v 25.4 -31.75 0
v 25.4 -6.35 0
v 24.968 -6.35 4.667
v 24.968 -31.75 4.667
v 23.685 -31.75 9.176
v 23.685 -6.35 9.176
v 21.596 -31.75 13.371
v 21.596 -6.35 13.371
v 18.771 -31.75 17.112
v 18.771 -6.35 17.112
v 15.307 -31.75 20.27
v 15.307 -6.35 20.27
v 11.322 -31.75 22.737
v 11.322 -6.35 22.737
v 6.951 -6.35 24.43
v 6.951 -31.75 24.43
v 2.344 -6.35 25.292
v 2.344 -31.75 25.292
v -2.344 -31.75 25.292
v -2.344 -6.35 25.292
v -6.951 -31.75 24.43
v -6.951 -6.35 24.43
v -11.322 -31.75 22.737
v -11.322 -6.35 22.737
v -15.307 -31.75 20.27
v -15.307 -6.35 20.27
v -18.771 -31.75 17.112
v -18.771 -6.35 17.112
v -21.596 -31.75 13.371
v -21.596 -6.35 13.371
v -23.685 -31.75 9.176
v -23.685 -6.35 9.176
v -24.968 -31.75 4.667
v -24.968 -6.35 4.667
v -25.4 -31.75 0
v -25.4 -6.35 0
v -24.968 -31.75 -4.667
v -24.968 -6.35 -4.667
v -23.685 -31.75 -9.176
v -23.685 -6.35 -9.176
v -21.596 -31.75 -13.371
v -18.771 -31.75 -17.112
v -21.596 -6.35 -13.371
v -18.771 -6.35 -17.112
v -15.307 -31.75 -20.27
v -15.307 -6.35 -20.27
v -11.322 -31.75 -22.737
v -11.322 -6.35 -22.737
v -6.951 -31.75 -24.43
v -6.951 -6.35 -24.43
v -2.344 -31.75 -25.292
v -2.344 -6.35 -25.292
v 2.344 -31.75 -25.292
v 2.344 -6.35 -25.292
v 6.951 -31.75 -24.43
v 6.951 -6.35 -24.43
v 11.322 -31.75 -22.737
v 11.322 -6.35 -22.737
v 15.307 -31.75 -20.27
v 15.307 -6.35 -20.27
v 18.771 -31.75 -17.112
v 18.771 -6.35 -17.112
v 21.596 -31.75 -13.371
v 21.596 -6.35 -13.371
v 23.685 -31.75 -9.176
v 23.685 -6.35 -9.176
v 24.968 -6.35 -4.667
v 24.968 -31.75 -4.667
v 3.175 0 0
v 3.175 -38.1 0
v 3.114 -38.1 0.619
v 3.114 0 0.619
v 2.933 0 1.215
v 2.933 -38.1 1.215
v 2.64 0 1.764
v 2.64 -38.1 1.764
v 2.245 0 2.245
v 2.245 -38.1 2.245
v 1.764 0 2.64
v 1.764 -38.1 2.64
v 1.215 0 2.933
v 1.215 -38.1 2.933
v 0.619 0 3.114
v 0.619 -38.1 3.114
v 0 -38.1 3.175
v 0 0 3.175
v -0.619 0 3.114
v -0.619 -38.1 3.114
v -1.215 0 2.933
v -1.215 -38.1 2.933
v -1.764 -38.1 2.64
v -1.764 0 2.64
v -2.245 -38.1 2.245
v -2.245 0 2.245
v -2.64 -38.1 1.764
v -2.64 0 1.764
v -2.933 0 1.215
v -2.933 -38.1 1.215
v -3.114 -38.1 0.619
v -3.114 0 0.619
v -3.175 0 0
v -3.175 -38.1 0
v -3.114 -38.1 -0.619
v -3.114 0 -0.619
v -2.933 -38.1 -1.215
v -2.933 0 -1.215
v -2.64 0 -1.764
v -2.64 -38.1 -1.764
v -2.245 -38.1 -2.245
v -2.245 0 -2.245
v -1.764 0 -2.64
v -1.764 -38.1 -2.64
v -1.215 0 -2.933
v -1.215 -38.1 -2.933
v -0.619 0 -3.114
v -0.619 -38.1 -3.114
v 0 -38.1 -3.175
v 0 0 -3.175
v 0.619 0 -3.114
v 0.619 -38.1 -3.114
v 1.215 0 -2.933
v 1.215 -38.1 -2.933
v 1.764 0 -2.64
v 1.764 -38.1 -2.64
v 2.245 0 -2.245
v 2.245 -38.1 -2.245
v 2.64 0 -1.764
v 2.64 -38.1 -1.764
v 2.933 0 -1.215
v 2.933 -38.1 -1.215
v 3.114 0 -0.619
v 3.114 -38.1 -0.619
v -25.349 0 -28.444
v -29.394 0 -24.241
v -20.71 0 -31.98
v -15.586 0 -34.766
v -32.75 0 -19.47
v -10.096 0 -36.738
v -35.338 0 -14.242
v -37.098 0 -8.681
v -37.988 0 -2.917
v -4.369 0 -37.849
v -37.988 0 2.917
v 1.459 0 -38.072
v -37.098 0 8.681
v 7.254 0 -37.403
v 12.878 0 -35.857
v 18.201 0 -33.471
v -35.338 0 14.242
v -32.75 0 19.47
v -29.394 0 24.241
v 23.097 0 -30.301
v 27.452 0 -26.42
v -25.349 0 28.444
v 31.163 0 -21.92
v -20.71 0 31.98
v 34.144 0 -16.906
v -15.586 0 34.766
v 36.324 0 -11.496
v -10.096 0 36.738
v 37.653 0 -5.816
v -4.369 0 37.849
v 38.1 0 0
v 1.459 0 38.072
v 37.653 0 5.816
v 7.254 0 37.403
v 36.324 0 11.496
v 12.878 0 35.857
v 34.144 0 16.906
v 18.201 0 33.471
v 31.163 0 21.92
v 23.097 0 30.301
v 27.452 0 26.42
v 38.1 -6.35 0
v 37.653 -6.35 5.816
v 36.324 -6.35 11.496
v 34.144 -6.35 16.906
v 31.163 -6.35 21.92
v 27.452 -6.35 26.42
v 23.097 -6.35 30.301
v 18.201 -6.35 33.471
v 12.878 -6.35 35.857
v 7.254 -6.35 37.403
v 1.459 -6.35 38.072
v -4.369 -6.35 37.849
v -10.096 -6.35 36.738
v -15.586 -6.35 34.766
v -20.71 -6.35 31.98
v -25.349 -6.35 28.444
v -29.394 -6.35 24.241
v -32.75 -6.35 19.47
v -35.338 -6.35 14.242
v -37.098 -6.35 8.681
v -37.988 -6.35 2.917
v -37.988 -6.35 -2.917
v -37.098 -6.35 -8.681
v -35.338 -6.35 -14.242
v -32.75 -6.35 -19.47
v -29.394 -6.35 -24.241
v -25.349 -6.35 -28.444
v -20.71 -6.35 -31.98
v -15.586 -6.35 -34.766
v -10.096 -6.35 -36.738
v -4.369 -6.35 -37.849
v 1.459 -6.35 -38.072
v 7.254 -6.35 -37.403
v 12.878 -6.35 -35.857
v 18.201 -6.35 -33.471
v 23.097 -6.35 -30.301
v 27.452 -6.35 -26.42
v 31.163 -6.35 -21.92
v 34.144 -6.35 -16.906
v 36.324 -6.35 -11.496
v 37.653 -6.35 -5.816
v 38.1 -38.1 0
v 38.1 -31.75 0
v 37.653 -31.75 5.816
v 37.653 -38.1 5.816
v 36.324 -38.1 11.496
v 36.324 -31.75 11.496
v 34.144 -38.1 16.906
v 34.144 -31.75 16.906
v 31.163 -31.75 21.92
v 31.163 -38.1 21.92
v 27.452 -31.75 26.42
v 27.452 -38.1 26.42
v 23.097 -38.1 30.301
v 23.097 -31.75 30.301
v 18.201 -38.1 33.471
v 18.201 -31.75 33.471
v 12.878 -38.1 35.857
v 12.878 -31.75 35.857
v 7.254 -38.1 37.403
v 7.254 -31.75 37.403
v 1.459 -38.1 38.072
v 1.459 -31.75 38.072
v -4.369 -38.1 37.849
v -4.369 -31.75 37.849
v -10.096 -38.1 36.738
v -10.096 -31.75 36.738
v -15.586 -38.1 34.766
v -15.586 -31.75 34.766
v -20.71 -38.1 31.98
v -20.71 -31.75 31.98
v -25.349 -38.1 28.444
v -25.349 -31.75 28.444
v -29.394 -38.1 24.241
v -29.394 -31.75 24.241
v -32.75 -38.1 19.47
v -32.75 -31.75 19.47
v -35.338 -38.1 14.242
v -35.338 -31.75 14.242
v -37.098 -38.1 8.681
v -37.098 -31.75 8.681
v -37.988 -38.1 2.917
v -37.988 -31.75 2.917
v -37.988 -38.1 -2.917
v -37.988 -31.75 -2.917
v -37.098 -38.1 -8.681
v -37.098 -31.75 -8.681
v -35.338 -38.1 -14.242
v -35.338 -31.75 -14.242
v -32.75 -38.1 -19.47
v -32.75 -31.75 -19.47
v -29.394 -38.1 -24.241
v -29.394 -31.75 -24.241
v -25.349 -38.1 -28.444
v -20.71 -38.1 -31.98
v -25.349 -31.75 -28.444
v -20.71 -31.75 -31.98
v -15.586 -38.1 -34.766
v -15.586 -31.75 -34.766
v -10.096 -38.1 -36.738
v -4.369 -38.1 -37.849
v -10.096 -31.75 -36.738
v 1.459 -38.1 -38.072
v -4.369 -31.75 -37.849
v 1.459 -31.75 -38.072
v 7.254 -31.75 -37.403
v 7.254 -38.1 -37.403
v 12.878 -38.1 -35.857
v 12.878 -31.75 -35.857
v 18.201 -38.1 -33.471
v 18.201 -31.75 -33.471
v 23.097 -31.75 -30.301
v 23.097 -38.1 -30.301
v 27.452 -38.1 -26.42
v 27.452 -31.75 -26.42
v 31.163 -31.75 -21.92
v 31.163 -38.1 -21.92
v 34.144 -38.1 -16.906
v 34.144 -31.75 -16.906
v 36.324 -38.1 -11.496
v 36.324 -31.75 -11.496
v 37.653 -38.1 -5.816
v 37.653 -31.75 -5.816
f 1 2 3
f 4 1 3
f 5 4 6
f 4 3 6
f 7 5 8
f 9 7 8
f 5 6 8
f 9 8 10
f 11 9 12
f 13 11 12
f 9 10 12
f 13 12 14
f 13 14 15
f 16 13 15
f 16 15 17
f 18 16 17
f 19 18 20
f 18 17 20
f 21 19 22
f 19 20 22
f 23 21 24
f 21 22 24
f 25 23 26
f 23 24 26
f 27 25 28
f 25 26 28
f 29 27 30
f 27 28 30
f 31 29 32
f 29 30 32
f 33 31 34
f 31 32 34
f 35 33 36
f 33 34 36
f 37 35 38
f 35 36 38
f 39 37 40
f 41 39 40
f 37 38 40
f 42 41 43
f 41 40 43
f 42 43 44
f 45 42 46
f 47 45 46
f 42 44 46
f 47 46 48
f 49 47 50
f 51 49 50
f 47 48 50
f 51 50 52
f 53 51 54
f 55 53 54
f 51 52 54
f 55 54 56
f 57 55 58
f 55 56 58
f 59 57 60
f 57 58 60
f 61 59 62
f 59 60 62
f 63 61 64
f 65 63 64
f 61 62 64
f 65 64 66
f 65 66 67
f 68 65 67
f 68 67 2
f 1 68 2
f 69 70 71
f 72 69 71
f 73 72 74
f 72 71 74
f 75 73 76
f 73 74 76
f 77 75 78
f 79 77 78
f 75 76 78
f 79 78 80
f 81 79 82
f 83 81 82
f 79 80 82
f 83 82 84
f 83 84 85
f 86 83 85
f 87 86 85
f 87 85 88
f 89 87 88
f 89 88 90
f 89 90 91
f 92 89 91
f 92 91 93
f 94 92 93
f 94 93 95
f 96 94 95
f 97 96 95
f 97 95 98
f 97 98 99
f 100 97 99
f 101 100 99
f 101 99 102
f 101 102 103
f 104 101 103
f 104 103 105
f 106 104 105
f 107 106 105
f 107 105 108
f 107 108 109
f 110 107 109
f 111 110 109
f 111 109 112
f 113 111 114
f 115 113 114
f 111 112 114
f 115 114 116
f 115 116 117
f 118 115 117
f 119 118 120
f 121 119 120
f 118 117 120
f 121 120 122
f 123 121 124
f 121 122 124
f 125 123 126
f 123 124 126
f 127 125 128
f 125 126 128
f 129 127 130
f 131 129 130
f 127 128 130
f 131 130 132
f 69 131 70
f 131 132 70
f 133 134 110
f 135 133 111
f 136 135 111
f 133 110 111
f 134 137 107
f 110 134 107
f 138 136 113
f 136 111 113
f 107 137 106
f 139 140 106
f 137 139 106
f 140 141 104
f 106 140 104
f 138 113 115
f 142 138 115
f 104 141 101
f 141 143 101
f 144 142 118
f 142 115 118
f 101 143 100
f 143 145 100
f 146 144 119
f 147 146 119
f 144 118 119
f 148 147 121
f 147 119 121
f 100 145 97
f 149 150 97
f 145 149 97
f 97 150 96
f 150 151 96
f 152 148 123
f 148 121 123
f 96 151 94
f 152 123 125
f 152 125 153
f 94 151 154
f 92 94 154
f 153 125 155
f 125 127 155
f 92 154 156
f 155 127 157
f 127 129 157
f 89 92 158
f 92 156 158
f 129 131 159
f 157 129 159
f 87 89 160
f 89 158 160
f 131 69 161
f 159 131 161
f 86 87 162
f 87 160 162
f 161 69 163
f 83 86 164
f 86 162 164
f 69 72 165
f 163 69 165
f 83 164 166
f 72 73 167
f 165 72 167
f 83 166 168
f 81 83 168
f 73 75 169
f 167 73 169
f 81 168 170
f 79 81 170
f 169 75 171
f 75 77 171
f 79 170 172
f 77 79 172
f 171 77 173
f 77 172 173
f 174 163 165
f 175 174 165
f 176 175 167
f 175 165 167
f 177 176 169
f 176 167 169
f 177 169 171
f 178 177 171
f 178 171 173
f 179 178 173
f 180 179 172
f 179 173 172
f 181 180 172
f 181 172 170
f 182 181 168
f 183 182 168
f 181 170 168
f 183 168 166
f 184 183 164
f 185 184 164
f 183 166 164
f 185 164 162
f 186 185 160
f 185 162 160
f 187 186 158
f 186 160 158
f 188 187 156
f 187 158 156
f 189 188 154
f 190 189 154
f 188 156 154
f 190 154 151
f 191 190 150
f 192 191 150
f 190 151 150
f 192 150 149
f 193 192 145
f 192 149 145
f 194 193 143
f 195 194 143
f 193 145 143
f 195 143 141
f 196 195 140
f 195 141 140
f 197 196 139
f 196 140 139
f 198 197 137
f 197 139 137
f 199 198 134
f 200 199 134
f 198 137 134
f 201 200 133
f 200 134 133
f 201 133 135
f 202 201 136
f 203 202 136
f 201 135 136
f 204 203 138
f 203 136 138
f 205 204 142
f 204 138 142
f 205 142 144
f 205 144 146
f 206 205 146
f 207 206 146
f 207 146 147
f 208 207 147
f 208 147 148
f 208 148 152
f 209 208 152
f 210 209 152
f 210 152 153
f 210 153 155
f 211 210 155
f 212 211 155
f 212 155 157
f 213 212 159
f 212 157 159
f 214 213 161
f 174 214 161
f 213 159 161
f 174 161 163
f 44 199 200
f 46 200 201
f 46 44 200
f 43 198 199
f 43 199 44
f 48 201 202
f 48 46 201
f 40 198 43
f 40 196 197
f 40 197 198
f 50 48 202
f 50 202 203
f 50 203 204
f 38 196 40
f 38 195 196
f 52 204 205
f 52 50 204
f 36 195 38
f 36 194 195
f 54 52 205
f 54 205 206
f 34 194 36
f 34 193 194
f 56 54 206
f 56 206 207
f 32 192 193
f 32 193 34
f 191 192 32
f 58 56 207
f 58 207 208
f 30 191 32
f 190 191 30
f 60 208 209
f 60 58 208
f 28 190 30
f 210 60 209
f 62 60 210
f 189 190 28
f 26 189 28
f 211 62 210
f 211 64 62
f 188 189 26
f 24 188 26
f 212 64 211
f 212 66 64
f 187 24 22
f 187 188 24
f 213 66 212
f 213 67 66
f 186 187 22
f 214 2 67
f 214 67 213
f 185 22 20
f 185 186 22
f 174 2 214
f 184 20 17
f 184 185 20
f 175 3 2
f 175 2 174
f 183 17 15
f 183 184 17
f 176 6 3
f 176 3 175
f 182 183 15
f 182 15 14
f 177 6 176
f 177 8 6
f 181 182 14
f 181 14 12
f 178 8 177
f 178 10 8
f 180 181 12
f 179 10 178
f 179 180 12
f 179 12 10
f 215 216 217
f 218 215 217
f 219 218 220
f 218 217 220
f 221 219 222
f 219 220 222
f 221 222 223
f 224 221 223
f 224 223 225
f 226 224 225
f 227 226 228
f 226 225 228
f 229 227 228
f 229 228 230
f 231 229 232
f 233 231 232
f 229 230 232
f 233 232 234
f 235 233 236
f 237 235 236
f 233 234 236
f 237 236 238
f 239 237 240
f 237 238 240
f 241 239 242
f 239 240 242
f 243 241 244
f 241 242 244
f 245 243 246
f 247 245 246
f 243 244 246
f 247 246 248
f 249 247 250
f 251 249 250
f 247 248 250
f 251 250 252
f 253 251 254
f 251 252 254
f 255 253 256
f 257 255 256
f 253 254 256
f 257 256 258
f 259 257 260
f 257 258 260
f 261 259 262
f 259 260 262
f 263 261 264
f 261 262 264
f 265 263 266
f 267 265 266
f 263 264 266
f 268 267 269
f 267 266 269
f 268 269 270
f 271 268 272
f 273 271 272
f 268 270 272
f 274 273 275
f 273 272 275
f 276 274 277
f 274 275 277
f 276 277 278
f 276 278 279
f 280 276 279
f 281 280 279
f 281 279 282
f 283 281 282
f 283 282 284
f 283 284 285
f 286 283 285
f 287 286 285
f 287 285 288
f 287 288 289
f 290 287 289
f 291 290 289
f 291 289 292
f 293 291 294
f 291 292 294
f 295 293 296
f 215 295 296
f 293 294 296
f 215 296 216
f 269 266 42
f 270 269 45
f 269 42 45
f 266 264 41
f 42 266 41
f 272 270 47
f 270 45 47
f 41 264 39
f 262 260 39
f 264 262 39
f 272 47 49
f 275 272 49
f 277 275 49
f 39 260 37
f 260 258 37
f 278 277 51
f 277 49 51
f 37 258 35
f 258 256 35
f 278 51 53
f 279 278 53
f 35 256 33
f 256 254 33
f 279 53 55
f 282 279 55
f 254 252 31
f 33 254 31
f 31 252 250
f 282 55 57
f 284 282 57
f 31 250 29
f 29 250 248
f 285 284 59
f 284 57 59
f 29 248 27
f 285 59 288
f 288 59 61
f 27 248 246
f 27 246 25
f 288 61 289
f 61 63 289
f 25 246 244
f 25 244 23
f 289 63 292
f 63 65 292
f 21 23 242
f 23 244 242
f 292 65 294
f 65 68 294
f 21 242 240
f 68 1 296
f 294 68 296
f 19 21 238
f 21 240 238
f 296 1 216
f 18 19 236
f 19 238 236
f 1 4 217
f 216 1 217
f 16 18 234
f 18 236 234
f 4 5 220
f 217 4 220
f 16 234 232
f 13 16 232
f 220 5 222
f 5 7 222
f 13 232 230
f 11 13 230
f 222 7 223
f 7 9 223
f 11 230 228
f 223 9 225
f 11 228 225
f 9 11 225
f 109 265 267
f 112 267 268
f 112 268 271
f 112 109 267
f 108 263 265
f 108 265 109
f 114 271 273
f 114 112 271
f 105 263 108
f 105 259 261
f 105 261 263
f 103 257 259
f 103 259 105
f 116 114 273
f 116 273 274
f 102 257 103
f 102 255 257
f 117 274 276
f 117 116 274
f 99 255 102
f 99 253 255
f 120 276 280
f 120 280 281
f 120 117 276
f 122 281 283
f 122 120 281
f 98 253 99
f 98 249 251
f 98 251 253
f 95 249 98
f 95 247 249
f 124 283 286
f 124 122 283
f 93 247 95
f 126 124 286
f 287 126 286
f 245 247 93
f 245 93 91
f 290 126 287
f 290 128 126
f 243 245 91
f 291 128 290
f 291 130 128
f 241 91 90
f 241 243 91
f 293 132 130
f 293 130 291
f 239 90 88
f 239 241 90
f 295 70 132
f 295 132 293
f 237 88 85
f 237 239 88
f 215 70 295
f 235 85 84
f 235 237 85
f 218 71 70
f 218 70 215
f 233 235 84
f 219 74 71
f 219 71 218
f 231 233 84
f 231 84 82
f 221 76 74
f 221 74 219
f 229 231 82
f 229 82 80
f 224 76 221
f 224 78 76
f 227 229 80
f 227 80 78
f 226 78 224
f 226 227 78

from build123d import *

# Parameters (mm, degrees)
F0_R     = 38.1
F1_DEPTH = 6.35
F2_R     = 25.4
F3_DEPTH = 25.4
F4_R     = 38.1
F4_R_2   = 25.4
F5_DEPTH = 6.35
F6_R     = 3.175
F7_DEPTH = 38.101


with BuildPart() as f1:
    # F0 (on Front) → F1 (new body)
    with BuildSketch(Plane.XZ):
        Circle(F0_R)
    extrude(amount=F1_DEPTH)

    # F2 (on face) → F3 (join)
    with BuildSketch(Plane.XZ.offset(6.35)):
        Circle(F2_R)
    extrude(amount=F3_DEPTH)

    # F4 (on face) → F5 (join)
    with BuildSketch(Plane.XZ.offset(31.75)):
        Circle(F4_R)
        Circle(F4_R_2, mode=Mode.SUBTRACT)
        Circle(F4_R_2)
    extrude(amount=F5_DEPTH)

    # F6 (on face) → F7 (cut, through all)
    with BuildSketch(Plane.XZ.offset(38.1)):
        Circle(F6_R)
    extrude(amount=-F7_DEPTH, mode=Mode.SUBTRACT)


solid = f1.part
